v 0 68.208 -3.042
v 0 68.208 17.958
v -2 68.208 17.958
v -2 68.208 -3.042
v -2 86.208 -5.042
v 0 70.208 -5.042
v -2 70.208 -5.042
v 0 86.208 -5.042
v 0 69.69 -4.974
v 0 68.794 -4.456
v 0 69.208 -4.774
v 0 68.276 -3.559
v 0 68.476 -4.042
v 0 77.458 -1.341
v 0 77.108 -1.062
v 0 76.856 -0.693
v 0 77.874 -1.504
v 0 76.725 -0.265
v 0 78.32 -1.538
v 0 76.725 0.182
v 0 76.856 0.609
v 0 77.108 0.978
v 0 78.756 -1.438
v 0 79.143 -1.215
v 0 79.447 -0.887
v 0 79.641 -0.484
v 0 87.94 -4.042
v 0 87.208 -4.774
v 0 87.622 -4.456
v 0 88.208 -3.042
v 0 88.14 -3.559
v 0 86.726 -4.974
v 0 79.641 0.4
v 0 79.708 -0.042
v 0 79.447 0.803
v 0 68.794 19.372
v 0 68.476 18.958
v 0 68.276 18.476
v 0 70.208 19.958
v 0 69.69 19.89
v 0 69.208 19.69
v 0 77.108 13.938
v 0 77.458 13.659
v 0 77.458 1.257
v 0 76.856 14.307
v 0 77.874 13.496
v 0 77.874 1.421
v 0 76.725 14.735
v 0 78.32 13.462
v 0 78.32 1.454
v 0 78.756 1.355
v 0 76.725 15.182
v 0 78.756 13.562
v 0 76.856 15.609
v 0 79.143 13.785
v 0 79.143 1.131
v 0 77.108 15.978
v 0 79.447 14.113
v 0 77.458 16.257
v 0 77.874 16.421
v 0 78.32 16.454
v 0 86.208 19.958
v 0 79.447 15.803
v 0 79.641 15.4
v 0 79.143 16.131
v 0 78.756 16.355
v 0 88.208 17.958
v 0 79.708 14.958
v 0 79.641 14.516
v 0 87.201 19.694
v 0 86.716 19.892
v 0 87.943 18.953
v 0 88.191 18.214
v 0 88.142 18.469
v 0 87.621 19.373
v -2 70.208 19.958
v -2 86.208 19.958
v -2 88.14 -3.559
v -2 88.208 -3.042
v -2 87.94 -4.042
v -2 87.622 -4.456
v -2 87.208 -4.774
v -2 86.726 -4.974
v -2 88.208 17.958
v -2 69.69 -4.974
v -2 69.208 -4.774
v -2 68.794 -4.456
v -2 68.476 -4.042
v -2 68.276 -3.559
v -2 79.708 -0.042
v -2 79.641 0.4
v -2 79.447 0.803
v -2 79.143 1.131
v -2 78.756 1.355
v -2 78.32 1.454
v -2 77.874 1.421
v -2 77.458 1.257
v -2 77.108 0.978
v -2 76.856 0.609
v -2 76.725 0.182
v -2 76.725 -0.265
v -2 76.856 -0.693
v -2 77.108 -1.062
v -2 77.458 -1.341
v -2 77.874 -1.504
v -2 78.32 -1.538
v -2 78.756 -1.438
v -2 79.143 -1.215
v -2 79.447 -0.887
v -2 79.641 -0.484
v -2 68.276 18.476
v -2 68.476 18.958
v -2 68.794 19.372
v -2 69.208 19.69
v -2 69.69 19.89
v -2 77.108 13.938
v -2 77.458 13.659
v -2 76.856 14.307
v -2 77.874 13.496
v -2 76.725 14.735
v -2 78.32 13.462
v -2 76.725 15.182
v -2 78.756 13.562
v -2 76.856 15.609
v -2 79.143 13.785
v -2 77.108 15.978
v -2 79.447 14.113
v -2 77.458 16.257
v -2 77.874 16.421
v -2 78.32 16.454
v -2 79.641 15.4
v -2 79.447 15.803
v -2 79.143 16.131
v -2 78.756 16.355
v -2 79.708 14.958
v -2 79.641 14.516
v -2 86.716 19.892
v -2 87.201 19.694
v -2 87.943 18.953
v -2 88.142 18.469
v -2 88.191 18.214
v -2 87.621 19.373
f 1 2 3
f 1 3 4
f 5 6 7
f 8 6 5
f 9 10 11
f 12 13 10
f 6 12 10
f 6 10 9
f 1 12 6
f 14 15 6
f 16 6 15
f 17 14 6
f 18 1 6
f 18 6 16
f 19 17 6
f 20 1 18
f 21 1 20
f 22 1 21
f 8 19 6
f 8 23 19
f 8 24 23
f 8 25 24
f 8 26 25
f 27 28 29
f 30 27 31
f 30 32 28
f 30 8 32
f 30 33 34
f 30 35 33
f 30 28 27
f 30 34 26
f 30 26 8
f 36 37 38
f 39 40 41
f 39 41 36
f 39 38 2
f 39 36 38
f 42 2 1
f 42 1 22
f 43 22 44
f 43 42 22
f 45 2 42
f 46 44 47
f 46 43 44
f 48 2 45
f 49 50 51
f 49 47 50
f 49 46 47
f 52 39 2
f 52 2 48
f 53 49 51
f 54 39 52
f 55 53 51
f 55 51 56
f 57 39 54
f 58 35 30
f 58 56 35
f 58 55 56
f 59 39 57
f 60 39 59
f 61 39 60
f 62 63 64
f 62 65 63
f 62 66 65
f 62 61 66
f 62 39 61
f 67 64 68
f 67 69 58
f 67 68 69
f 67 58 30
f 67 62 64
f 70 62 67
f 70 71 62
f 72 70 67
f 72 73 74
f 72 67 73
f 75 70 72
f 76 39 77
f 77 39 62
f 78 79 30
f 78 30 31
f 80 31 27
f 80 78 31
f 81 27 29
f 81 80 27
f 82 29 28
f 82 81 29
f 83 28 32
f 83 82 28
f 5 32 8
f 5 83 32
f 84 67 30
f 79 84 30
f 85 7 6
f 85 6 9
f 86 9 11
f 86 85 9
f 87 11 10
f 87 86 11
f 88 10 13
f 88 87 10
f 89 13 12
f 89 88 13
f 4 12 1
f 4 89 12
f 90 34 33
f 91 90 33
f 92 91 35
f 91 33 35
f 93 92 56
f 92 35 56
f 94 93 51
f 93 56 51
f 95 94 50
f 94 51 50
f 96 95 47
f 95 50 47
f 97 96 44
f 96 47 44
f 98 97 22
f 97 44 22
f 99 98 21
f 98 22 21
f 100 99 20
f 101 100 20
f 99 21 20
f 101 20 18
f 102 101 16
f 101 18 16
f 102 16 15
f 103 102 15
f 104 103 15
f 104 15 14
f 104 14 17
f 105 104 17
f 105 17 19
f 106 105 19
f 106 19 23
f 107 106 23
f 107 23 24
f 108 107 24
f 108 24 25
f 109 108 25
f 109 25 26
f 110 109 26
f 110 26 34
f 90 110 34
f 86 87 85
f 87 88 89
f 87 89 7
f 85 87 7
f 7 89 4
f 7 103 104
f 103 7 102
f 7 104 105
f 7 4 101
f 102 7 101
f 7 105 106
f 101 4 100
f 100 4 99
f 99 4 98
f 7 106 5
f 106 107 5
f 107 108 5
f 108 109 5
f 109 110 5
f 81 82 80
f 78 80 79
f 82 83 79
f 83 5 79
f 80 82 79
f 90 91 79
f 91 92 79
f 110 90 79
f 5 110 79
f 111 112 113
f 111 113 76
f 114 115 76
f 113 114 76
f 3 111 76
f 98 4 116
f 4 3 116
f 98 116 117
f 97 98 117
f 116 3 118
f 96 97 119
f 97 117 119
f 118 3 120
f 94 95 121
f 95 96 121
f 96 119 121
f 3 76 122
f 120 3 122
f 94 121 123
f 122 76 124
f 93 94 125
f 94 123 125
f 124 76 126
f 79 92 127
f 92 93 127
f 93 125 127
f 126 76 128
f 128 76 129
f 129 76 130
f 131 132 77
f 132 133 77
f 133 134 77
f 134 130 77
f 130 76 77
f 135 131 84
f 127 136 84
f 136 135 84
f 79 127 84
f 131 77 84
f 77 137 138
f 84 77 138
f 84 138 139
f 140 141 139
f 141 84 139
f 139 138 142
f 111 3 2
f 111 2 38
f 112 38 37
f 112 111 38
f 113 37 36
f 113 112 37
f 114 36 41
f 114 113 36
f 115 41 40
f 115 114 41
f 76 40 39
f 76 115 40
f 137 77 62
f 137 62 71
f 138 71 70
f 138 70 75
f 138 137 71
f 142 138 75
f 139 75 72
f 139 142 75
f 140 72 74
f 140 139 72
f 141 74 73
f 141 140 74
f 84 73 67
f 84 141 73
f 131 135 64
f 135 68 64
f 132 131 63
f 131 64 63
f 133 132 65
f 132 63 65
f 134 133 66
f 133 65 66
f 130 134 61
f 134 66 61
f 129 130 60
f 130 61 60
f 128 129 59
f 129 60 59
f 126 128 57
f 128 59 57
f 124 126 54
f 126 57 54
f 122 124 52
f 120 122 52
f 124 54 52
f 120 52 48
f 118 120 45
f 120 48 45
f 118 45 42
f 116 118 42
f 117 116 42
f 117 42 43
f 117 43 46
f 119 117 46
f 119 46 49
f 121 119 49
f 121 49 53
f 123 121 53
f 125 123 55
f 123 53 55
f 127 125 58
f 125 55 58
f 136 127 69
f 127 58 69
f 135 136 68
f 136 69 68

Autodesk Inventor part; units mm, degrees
ref_plane "YZ Plane" through (0, 0, 0) normal (1, 0, 0) x (0, 1, 0)
ref_plane "XZ Plane" through (0, 0, 0) normal (0, 1, 0) x (-1, 0, 0)
ref_plane "XY Plane" through (0, 0, 0) normal (0, 0, 1) x (1, 0, 0)
sketch "スケッチ1" plane through (0, 0, 0) normal (1, 0, 0) x (0, 1, 0)
  line L0 (68.2079, 642.9582) -> (68.2079, -632.5418)
  circle A0 centre (78.2079, 14.9582) radius 1.5
  line L1 (88.2079, -632.5418) -> (68.2079, -632.5418)
  circle A1 centre (78.2079, -0.0418) radius 1.5
  circle A2 centre (78.2079, 14.9582) radius 1.5
  line L2 (68.2079, -5.0418) -> (88.2079, -5.0418)
  line L3 (68.2079, 19.9582) -> (88.2079, 19.9582)
  line L4 (87.2079, 642.9582) -> (87.2079, 7.4582)
  line L5 (68.2079, 19.9582) -> (68.2079, -5.0418)
  line L6 (88.2079, 19.9582) -> (88.2079, -5.0418)
  line L7 (88.2079, 642.9582) -> (88.2079, -632.5418)
  point P0 (0, 0)
  point P1 (-76.7921, 17.4582)
  point P2 (78.2079, -625.0418)
  dimension "d0" = 10
  dimension "d1" = 15
  dimension "d2" = 7.5
  dimension "d3" = 10
  dimension "d4" = 3
  dimension "d5" = 3
  dimension "d6" = 5
  dimension "d7" = 5
extrude "押し出し1" add sketch "スケッチ1" against normal blind 2 contours L3 L6 L2 L0
fillet "フィレット1" radius 2 4 edges at (-1, 88.2079, 19.9582) (-1, 68.2079, 19.9582) (-1, 88.2079, -5.0418) (-1, 68.2079, -5.0418)
properties part number "base_weel-v1-Plate-expand-2" material "アルミニウム 6061"
